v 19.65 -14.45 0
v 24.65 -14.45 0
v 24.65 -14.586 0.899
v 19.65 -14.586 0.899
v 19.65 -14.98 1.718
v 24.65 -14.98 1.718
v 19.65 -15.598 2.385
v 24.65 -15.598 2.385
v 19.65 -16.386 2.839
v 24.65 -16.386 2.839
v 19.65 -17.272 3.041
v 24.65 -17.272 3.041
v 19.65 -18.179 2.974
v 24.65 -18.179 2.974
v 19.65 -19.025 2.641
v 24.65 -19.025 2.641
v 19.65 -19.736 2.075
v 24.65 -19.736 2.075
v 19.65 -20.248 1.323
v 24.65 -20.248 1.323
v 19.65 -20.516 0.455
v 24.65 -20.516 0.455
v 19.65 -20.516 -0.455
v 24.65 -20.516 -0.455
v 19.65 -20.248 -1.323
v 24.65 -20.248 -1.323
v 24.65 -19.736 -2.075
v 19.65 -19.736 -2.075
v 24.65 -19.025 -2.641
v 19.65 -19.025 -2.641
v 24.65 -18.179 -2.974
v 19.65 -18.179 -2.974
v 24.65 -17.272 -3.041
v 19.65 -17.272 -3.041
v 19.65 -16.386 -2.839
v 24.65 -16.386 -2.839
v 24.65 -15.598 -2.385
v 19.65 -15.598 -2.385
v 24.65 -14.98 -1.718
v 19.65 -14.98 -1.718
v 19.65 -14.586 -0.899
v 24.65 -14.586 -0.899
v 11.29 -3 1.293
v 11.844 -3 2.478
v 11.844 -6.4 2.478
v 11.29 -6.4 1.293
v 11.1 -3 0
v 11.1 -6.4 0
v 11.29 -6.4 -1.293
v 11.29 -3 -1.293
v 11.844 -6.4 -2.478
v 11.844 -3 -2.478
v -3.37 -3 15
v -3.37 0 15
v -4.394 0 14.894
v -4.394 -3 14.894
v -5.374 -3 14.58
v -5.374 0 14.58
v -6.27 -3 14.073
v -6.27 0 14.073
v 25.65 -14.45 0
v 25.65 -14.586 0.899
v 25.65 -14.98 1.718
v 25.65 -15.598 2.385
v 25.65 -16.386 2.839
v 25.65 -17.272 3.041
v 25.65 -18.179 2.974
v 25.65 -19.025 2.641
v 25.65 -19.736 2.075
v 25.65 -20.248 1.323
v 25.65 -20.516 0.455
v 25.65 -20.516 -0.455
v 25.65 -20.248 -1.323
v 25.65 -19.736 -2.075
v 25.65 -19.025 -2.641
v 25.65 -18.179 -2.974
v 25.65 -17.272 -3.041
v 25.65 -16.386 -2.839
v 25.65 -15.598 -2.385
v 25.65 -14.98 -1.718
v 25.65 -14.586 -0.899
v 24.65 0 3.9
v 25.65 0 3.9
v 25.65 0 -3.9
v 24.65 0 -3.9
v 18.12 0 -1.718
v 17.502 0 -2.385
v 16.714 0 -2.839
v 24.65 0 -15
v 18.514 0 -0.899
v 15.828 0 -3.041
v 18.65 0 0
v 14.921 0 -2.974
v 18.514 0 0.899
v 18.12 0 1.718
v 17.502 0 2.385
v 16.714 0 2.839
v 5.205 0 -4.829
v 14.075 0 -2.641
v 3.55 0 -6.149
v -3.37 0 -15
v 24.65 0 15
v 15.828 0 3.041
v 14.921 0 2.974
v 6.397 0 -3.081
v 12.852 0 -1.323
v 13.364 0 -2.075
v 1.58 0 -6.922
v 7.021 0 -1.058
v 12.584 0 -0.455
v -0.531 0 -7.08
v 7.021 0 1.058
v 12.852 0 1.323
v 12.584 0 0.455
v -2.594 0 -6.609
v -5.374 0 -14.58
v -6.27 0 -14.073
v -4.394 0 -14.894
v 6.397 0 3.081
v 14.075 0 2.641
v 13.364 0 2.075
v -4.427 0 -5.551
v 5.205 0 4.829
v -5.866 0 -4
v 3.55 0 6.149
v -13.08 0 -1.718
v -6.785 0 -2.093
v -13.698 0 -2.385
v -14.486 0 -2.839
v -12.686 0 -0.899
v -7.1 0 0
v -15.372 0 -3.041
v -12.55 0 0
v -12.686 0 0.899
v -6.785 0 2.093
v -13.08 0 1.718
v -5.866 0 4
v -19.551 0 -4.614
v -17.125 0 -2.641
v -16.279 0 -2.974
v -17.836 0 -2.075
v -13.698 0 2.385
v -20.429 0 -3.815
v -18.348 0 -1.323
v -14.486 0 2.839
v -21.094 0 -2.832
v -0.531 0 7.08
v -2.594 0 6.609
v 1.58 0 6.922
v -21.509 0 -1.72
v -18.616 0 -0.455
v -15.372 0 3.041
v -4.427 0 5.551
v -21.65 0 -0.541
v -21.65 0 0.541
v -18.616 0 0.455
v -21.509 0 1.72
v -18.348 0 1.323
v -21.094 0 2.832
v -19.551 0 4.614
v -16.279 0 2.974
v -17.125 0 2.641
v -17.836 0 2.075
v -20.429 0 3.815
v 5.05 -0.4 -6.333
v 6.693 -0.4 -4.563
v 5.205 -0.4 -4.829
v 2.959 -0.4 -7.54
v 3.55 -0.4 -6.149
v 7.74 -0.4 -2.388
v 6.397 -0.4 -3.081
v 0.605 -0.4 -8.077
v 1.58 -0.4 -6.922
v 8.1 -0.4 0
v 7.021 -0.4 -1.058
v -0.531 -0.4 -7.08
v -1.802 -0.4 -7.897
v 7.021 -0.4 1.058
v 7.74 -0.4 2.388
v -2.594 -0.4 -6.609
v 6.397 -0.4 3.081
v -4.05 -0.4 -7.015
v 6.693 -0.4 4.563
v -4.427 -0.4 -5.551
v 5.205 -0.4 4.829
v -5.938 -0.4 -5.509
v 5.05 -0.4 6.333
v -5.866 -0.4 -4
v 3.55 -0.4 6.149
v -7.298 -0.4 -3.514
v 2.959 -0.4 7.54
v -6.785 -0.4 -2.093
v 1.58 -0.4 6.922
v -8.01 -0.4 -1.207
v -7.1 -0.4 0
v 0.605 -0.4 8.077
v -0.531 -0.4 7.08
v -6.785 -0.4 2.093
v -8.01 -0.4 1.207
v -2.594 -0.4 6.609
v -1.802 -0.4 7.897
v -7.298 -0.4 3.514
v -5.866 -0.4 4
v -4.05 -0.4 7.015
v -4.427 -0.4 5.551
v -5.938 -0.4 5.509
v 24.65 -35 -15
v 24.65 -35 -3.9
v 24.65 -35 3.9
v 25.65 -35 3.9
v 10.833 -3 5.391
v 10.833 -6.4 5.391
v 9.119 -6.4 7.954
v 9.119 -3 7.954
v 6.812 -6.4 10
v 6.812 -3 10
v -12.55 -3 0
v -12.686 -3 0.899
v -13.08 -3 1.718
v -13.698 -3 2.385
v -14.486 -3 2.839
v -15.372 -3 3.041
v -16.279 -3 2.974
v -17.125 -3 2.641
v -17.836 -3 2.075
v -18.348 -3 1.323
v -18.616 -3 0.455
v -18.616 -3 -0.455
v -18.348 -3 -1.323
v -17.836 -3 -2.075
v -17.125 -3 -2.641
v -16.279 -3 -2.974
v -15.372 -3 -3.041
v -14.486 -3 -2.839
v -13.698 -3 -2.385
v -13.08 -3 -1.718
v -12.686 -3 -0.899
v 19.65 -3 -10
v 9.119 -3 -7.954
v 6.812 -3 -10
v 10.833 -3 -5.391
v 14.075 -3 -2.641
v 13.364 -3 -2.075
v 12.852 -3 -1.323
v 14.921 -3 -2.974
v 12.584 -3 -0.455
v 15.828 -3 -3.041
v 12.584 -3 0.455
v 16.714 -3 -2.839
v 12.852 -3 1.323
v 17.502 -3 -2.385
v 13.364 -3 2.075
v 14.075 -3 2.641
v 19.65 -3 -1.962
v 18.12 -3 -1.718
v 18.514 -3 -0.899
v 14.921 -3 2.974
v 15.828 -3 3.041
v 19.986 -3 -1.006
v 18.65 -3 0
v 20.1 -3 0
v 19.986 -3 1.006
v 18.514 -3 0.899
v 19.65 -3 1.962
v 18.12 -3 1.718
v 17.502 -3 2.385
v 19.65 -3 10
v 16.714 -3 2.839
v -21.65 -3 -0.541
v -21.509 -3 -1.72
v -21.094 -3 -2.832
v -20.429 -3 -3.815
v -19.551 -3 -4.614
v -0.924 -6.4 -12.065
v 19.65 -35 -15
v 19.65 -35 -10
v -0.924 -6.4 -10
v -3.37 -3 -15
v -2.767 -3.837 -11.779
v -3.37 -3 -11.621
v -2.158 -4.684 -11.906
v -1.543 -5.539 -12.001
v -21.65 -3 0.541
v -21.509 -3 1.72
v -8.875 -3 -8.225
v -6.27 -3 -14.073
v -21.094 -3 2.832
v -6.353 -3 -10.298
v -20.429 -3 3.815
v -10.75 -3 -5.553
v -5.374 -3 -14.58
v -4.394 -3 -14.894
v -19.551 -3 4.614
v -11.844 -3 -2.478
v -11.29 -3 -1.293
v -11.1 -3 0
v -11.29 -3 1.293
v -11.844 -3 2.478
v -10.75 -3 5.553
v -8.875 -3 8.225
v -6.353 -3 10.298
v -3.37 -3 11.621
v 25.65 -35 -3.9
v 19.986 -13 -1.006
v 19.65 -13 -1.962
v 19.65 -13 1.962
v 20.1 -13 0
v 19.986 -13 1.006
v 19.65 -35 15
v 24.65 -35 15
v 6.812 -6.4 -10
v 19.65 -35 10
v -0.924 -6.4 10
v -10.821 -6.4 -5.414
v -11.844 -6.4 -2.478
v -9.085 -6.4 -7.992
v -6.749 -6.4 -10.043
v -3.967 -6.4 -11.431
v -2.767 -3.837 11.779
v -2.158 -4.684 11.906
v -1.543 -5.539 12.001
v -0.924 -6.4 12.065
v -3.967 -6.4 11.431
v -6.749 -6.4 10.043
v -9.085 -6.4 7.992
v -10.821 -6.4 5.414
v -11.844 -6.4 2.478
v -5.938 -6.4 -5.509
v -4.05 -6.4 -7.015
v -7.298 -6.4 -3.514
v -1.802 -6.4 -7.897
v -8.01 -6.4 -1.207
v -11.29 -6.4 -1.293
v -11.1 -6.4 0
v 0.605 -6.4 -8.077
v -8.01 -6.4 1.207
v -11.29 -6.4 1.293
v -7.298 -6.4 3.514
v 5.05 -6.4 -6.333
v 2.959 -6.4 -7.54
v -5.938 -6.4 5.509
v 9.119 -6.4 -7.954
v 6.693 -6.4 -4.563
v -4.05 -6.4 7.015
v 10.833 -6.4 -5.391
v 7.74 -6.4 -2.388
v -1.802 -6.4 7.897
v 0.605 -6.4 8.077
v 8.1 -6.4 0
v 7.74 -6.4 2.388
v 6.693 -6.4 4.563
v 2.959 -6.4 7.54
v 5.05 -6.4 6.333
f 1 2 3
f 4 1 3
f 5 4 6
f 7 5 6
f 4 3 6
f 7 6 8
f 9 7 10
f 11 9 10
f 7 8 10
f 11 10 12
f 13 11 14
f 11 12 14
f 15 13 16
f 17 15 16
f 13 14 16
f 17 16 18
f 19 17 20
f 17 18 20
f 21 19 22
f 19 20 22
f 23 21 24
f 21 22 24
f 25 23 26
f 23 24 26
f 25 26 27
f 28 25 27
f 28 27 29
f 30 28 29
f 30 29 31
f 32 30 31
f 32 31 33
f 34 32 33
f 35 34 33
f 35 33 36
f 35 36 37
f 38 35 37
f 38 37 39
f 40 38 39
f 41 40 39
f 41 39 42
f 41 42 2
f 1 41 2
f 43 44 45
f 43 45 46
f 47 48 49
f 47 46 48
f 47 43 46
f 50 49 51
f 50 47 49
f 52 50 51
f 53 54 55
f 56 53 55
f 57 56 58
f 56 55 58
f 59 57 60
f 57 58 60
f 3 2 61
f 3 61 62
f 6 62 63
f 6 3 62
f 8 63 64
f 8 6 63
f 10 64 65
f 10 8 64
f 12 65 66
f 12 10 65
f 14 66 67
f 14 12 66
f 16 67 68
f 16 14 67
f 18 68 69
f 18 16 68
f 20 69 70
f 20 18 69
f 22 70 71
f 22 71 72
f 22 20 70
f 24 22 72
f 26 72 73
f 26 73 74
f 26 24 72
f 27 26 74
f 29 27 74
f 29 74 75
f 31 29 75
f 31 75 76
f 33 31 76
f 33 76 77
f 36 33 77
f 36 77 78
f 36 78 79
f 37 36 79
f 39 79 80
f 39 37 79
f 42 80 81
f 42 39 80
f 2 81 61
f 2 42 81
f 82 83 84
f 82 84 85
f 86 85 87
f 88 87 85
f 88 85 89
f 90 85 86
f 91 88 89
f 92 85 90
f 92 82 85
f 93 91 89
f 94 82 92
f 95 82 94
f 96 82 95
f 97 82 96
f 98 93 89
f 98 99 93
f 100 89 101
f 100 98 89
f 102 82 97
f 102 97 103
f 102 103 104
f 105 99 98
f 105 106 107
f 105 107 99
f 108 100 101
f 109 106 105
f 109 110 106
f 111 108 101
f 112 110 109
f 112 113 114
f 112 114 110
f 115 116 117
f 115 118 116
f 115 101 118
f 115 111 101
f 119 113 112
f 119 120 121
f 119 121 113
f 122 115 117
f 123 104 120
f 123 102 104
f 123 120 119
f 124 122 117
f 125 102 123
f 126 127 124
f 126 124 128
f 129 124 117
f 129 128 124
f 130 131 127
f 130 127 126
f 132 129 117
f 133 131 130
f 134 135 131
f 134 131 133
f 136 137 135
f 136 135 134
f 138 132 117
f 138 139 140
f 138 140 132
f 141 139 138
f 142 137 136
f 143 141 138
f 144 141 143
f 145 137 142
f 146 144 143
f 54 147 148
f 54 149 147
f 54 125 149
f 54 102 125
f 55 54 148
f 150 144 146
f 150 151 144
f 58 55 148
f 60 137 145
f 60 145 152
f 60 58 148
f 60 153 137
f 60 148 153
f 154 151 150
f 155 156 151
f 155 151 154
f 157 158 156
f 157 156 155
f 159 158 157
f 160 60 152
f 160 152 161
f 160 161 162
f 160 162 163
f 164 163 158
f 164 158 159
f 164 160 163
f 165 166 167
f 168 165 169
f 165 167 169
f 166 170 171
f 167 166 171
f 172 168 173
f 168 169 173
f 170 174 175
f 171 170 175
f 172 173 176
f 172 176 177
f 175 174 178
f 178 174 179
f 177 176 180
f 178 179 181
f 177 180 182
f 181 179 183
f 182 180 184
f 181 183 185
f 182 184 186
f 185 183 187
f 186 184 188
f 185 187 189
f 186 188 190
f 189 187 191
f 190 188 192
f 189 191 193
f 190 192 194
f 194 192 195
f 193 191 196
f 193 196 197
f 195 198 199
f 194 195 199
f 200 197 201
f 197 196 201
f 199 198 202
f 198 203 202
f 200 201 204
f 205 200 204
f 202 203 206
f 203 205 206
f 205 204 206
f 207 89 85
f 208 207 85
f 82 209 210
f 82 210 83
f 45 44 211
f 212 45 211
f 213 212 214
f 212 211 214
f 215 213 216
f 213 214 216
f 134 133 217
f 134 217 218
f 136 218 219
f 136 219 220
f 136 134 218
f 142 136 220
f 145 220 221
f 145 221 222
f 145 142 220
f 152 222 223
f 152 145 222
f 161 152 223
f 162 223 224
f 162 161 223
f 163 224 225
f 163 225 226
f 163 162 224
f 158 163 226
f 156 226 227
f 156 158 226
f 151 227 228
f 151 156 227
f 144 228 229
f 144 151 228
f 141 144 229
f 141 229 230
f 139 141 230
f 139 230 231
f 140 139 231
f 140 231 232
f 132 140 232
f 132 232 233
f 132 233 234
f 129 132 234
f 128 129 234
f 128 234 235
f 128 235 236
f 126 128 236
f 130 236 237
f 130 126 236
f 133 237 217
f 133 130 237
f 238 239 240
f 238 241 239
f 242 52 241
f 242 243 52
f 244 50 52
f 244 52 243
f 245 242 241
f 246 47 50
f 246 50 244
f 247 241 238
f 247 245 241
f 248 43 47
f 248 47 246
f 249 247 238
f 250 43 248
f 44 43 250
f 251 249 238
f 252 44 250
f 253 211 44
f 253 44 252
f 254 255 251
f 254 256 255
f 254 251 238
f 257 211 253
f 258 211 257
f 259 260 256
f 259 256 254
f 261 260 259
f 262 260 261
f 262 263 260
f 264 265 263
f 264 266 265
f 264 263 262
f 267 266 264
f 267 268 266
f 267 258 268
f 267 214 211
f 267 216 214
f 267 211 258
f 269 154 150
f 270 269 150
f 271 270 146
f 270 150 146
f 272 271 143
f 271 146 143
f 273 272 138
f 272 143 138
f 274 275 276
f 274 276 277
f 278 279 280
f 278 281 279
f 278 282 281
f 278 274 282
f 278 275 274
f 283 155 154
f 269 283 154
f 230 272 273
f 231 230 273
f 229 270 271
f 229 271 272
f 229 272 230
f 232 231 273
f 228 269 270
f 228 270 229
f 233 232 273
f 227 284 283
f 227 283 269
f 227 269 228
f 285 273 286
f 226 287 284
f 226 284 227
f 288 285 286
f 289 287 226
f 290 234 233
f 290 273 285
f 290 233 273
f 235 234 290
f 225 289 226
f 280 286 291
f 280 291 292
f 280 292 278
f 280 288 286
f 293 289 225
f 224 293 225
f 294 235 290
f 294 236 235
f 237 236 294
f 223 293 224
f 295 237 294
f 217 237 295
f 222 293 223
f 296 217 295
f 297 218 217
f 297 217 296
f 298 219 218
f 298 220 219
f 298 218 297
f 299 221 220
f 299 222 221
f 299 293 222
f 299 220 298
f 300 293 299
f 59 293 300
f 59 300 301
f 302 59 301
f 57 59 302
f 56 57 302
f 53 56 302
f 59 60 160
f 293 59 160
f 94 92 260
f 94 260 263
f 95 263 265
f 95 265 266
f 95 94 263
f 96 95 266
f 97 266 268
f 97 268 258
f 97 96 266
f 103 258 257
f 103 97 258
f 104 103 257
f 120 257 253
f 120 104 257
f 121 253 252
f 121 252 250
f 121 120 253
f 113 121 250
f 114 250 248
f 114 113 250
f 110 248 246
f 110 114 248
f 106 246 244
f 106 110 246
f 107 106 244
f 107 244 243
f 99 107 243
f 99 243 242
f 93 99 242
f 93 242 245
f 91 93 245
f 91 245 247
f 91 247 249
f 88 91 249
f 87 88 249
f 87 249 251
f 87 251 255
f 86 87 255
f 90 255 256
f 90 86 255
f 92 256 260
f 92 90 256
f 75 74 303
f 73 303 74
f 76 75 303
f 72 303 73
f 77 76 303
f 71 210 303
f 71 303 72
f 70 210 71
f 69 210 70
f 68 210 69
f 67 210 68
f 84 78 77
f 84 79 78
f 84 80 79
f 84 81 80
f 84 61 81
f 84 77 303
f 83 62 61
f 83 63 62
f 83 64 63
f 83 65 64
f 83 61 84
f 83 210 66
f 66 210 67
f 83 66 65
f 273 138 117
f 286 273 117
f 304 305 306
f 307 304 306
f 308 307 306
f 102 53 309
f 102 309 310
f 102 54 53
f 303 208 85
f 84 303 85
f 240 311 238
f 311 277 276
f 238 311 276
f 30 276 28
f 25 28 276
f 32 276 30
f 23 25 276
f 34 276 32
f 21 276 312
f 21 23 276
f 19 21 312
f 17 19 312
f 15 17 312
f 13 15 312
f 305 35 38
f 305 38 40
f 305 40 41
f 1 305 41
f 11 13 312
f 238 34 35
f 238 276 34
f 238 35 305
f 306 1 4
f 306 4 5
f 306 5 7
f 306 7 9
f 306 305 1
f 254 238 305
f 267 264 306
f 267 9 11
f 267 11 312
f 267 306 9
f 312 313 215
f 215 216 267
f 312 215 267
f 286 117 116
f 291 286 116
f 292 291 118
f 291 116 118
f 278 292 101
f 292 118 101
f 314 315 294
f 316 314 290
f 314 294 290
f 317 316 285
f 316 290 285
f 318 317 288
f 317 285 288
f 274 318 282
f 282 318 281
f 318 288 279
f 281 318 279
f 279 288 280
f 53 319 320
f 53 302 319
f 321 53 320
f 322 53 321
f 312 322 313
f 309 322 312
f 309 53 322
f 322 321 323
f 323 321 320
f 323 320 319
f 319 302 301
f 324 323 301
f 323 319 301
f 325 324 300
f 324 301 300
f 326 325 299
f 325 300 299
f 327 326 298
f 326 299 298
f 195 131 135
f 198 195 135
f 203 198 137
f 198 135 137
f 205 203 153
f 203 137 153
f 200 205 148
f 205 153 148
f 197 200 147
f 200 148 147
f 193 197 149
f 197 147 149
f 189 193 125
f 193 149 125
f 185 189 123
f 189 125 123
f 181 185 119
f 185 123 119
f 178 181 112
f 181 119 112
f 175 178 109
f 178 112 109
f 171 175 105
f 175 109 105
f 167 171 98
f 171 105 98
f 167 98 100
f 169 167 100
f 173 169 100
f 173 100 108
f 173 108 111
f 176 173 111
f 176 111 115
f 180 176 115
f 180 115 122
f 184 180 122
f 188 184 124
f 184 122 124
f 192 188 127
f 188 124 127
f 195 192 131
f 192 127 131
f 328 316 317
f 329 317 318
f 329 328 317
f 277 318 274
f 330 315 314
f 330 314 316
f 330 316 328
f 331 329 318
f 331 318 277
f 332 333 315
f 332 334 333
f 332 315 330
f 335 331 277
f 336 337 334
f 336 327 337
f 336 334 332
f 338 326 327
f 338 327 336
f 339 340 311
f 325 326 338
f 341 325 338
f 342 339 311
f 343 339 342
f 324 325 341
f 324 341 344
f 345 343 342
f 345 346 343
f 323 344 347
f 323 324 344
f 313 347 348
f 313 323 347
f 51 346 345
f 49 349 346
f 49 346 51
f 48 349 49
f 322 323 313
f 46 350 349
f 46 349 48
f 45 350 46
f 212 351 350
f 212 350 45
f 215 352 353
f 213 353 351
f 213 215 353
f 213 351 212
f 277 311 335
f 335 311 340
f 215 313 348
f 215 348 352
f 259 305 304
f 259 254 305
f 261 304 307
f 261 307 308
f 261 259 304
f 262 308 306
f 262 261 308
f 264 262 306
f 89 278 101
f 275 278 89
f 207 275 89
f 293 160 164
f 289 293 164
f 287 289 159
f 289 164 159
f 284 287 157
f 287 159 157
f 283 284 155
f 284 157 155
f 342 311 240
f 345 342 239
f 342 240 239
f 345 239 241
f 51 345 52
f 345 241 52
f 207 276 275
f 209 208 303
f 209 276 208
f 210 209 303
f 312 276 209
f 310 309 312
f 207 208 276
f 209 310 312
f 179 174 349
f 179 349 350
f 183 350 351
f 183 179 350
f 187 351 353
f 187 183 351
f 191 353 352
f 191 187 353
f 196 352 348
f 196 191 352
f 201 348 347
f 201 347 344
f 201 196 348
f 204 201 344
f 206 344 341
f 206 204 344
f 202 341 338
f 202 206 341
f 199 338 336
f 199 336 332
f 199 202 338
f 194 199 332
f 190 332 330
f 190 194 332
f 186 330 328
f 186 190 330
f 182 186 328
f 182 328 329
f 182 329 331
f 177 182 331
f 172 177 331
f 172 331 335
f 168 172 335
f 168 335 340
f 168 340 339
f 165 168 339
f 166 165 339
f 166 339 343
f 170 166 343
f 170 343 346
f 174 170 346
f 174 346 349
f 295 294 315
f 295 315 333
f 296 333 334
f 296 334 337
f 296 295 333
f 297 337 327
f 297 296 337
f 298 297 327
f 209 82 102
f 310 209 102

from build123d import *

# Parameters (mm, degrees)
F0_R      = 12.1
F0_R_2    = 8.1
F1_DEPTH  = 6.4
F0_R_3    = 3.05
F0_W      = 5
F0_H      = 30
F2_DEPTH  = 3
F3_R      = 8.1
F3_R_2    = 7.1
F4_DEPTH  = 0.4
F5_DEPTH  = 35
F6_R      = 4.5
F7_DEPTH  = 10
F9_DEPTH  = 5
F11_DEPTH = 5
F12_W     = 35
F12_H     = 7.8
F12_R     = 3.05
F13_DEPTH = 1
F14_DEPTH = 46.301


with BuildPart() as f1:
    # F0 (on Front) → F1 (new body)
    with BuildSketch(Plane.XZ):
        Circle(F0_R)
        Circle(F0_R_2, mode=Mode.SUBTRACT)
    extrude(amount=F1_DEPTH)

    # F0 (on Front) → F2 (join)
    with BuildSketch(Plane.XZ):
        with BuildLine():
            Line((-21.65, 0.5412544591), (-21.65, -0.5412544591))
            ThreePointArc((-21.65, -0.5412544591), (-21.0942775075, -2.8321925717), (-19.5506410256, -4.6138803491))
            Line((-19.5506410256, -4.6138803491), (-6.2701517693, -14.0726258901))
            ThreePointArc((-6.2701517693, -14.0726258901), (-4.892151632, -14.7625166378), (-3.3695107437, -15))
            Line((-3.3695107437, -15), (19.65, -15))
            Line((19.65, -15), (19.65, 15))
            Line((19.65, 15), (-3.3695107437, 15))
            ThreePointArc((-3.3695107437, 15), (-4.892151632, 14.7625166378), (-6.2701517693, 14.0726258901))
            Line((-6.2701517693, 14.0726258901), (-19.5506410256, 4.6138803491))
            ThreePointArc((-19.5506410256, 4.6138803491), (-21.0942775075, 2.8321925717), (-21.65, 0.5412544591))
        make_face()
        with Locations((-15.6, 0)):
            Circle(F0_R_3, mode=Mode.SUBTRACT)
        Circle(F0_R, mode=Mode.SUBTRACT)
        with Locations((15.6, 0)):
            Circle(F0_R_3, mode=Mode.SUBTRACT)
        with Locations((22.15, 0)):
            Rectangle(F0_W, F0_H)
    extrude(amount=F2_DEPTH)

    # F3 (on face) → F4 (join)
    with BuildSketch(Plane(origin=(0, 0, 0), x_dir=(-1, 0, 0), z_dir=(0, 1, 0))):
        Circle(F3_R)
        Circle(F3_R_2, mode=Mode.SUBTRACT)
    extrude(amount=-F4_DEPTH)

    # F0 (on Front) → F5 (join)
    with BuildSketch(Plane.XZ):
        with Locations((22.15, 0)):
            Rectangle(F0_W, F0_H)
    extrude(amount=F5_DEPTH)

    # F6 (on face) → F7 (cut)
    with BuildSketch(Plane.XZ.offset(3)):
        with Locations((-15.6, 0)):
            Circle(F6_R)
        with Locations((15.6, 0)):
            Circle(F6_R)
    extrude(amount=F7_DEPTH, mode=Mode.SUBTRACT)

    # F8 (on face) → F9 (join)
    with BuildSketch(Plane(origin=(0, 0, -15), x_dir=(1, 0, 0), z_dir=(0, 0, -1))):
        Polygon((19.65, 3), (19.65, 35), (-3.3695107437, 3), align=None)
    extrude(amount=-F9_DEPTH)

    # F10 (on face) → F11 (join)
    with BuildSketch(Plane.XY.offset(15)):
        Polygon((19.65, -3), (-3.3695107437, -3), (19.65, -35), align=None)
    extrude(amount=-F11_DEPTH)

    # F12 (on face) → F13 (join)
    with BuildSketch(Plane.YZ.offset(24.65)):
        with Locations((-17.5, 0)):
            Rectangle(F12_W, F12_H)
        with Locations((-17.5, 0)):
            Circle(F12_R, mode=Mode.SUBTRACT)
    extrude(amount=F13_DEPTH)

    # F14 (cut, through all): a face of the model
    f14_faces = [f1.faces().sort_by_distance(p)[0] for p in [
        (24.65, -17.5, 0),
    ]]
    extrude(f14_faces, amount=-F14_DEPTH, mode=Mode.SUBTRACT)


solid = f1.part
